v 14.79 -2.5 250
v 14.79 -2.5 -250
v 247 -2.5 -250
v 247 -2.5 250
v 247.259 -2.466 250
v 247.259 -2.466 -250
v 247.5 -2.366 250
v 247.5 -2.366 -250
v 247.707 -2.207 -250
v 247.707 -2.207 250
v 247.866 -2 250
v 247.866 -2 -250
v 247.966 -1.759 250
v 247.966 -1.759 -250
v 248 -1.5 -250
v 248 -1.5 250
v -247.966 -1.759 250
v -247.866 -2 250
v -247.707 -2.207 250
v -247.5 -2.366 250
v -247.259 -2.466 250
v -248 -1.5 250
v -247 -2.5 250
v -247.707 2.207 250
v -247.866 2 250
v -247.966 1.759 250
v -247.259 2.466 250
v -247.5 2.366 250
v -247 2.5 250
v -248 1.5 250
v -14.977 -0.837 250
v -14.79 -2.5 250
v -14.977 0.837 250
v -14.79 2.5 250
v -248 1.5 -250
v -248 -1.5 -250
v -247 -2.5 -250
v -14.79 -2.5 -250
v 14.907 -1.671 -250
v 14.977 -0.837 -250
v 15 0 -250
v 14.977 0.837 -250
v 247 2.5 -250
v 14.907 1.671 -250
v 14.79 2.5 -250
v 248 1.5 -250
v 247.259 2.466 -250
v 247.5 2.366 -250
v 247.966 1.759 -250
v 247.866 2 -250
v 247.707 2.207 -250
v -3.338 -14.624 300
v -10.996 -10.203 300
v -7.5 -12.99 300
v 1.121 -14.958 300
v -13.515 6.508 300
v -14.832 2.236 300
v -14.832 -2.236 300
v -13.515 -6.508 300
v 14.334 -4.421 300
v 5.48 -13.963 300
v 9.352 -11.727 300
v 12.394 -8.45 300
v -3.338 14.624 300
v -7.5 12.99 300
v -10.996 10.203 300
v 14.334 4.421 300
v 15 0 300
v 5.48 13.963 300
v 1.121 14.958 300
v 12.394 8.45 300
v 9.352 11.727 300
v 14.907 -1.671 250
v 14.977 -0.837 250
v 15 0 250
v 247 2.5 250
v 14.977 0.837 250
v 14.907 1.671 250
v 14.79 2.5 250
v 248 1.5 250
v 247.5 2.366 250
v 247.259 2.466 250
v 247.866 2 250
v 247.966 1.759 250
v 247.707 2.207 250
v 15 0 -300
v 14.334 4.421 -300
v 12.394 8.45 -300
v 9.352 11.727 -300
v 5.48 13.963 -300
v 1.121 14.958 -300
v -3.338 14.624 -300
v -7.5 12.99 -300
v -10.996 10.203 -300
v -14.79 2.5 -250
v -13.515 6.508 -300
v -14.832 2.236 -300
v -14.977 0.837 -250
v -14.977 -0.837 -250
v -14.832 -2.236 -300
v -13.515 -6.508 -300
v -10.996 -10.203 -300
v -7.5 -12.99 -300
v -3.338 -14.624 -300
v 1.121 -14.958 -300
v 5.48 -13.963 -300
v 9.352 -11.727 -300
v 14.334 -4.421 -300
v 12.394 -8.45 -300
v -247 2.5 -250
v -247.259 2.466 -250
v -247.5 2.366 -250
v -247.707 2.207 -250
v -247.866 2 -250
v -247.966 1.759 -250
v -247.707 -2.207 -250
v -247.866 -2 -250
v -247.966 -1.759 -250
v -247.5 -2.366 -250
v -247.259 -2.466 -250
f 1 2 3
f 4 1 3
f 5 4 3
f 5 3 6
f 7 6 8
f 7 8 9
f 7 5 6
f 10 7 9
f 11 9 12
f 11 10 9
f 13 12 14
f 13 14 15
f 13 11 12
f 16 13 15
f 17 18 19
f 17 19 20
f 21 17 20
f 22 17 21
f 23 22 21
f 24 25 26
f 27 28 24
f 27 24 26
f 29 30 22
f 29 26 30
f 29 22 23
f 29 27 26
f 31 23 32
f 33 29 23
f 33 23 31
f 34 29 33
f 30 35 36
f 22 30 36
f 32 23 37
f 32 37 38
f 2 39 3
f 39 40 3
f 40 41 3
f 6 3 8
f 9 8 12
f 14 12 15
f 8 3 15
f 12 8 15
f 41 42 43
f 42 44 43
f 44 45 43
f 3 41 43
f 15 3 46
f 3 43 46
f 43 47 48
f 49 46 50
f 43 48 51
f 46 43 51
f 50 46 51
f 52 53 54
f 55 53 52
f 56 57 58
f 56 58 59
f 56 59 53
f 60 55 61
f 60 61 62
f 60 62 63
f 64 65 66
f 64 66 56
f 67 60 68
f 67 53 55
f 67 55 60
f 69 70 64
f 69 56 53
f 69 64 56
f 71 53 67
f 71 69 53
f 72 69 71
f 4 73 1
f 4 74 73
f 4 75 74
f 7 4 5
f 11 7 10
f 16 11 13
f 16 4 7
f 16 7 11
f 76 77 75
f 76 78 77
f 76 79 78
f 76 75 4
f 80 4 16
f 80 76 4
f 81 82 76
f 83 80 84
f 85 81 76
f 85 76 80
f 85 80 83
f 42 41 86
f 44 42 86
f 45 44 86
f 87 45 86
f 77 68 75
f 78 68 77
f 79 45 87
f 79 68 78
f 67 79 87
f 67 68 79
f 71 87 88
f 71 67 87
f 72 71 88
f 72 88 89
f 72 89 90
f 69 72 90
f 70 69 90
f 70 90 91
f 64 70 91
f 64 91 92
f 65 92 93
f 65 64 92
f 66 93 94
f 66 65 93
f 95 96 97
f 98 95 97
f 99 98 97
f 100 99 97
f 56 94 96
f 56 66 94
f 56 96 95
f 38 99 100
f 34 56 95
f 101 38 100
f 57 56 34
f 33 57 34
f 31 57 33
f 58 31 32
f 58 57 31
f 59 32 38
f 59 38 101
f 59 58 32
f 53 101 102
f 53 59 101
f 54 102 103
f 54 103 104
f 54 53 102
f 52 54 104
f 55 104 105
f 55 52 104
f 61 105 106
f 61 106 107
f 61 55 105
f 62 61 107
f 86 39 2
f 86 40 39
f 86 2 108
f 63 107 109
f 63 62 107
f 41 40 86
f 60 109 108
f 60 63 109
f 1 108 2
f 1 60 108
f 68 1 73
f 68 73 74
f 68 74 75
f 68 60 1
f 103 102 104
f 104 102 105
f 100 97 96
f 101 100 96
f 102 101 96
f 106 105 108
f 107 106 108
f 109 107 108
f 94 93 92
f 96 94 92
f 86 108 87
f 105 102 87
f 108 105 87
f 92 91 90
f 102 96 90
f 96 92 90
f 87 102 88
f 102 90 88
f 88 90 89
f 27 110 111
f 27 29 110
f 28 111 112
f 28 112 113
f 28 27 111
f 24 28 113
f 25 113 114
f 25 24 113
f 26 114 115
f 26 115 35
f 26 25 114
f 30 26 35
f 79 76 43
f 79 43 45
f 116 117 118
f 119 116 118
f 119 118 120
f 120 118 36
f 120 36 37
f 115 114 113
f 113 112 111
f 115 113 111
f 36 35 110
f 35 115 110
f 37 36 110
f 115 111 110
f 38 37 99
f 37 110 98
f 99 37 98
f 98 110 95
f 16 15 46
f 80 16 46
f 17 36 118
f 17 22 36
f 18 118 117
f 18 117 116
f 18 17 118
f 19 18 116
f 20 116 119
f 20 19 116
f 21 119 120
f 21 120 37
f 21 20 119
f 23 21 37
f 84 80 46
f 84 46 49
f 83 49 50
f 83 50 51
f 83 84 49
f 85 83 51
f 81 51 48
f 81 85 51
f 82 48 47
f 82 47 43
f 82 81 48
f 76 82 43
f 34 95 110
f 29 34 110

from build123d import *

# Parameters (mm, degrees)
F0_R     = 15
F1_DEPTH = 300
F3_DEPTH = 250


with BuildPart() as f1:
    # F0 (on Top) → F1 (new body, symmetric)
    with BuildSketch(Plane.XY):
        Circle(F0_R)
    extrude(amount=F1_DEPTH, both=True)

    # F2 (on Top) → F3 (join, symmetric)
    with BuildSketch(Plane.XY):
        with BuildLine():
            ThreePointArc((-248, -1.5), (-247.707107, -2.207107), (-247, -2.5))
            Line((-247, -2.5), (247, -2.5))
            ThreePointArc((247, -2.5), (247.707107, -2.207107), (248, -1.5))
            Line((248, -1.5), (248, 1.5))
            ThreePointArc((248, 1.5), (247.707107, 2.207107), (247, 2.5))
            Line((247, 2.5), (-247, 2.5))
            ThreePointArc((-247, 2.5), (-247.707107, 2.207107), (-248, 1.5))
            Line((-248, 1.5), (-248, -1.5))
        make_face()
    extrude(amount=F3_DEPTH, both=True)


solid = f1.part
